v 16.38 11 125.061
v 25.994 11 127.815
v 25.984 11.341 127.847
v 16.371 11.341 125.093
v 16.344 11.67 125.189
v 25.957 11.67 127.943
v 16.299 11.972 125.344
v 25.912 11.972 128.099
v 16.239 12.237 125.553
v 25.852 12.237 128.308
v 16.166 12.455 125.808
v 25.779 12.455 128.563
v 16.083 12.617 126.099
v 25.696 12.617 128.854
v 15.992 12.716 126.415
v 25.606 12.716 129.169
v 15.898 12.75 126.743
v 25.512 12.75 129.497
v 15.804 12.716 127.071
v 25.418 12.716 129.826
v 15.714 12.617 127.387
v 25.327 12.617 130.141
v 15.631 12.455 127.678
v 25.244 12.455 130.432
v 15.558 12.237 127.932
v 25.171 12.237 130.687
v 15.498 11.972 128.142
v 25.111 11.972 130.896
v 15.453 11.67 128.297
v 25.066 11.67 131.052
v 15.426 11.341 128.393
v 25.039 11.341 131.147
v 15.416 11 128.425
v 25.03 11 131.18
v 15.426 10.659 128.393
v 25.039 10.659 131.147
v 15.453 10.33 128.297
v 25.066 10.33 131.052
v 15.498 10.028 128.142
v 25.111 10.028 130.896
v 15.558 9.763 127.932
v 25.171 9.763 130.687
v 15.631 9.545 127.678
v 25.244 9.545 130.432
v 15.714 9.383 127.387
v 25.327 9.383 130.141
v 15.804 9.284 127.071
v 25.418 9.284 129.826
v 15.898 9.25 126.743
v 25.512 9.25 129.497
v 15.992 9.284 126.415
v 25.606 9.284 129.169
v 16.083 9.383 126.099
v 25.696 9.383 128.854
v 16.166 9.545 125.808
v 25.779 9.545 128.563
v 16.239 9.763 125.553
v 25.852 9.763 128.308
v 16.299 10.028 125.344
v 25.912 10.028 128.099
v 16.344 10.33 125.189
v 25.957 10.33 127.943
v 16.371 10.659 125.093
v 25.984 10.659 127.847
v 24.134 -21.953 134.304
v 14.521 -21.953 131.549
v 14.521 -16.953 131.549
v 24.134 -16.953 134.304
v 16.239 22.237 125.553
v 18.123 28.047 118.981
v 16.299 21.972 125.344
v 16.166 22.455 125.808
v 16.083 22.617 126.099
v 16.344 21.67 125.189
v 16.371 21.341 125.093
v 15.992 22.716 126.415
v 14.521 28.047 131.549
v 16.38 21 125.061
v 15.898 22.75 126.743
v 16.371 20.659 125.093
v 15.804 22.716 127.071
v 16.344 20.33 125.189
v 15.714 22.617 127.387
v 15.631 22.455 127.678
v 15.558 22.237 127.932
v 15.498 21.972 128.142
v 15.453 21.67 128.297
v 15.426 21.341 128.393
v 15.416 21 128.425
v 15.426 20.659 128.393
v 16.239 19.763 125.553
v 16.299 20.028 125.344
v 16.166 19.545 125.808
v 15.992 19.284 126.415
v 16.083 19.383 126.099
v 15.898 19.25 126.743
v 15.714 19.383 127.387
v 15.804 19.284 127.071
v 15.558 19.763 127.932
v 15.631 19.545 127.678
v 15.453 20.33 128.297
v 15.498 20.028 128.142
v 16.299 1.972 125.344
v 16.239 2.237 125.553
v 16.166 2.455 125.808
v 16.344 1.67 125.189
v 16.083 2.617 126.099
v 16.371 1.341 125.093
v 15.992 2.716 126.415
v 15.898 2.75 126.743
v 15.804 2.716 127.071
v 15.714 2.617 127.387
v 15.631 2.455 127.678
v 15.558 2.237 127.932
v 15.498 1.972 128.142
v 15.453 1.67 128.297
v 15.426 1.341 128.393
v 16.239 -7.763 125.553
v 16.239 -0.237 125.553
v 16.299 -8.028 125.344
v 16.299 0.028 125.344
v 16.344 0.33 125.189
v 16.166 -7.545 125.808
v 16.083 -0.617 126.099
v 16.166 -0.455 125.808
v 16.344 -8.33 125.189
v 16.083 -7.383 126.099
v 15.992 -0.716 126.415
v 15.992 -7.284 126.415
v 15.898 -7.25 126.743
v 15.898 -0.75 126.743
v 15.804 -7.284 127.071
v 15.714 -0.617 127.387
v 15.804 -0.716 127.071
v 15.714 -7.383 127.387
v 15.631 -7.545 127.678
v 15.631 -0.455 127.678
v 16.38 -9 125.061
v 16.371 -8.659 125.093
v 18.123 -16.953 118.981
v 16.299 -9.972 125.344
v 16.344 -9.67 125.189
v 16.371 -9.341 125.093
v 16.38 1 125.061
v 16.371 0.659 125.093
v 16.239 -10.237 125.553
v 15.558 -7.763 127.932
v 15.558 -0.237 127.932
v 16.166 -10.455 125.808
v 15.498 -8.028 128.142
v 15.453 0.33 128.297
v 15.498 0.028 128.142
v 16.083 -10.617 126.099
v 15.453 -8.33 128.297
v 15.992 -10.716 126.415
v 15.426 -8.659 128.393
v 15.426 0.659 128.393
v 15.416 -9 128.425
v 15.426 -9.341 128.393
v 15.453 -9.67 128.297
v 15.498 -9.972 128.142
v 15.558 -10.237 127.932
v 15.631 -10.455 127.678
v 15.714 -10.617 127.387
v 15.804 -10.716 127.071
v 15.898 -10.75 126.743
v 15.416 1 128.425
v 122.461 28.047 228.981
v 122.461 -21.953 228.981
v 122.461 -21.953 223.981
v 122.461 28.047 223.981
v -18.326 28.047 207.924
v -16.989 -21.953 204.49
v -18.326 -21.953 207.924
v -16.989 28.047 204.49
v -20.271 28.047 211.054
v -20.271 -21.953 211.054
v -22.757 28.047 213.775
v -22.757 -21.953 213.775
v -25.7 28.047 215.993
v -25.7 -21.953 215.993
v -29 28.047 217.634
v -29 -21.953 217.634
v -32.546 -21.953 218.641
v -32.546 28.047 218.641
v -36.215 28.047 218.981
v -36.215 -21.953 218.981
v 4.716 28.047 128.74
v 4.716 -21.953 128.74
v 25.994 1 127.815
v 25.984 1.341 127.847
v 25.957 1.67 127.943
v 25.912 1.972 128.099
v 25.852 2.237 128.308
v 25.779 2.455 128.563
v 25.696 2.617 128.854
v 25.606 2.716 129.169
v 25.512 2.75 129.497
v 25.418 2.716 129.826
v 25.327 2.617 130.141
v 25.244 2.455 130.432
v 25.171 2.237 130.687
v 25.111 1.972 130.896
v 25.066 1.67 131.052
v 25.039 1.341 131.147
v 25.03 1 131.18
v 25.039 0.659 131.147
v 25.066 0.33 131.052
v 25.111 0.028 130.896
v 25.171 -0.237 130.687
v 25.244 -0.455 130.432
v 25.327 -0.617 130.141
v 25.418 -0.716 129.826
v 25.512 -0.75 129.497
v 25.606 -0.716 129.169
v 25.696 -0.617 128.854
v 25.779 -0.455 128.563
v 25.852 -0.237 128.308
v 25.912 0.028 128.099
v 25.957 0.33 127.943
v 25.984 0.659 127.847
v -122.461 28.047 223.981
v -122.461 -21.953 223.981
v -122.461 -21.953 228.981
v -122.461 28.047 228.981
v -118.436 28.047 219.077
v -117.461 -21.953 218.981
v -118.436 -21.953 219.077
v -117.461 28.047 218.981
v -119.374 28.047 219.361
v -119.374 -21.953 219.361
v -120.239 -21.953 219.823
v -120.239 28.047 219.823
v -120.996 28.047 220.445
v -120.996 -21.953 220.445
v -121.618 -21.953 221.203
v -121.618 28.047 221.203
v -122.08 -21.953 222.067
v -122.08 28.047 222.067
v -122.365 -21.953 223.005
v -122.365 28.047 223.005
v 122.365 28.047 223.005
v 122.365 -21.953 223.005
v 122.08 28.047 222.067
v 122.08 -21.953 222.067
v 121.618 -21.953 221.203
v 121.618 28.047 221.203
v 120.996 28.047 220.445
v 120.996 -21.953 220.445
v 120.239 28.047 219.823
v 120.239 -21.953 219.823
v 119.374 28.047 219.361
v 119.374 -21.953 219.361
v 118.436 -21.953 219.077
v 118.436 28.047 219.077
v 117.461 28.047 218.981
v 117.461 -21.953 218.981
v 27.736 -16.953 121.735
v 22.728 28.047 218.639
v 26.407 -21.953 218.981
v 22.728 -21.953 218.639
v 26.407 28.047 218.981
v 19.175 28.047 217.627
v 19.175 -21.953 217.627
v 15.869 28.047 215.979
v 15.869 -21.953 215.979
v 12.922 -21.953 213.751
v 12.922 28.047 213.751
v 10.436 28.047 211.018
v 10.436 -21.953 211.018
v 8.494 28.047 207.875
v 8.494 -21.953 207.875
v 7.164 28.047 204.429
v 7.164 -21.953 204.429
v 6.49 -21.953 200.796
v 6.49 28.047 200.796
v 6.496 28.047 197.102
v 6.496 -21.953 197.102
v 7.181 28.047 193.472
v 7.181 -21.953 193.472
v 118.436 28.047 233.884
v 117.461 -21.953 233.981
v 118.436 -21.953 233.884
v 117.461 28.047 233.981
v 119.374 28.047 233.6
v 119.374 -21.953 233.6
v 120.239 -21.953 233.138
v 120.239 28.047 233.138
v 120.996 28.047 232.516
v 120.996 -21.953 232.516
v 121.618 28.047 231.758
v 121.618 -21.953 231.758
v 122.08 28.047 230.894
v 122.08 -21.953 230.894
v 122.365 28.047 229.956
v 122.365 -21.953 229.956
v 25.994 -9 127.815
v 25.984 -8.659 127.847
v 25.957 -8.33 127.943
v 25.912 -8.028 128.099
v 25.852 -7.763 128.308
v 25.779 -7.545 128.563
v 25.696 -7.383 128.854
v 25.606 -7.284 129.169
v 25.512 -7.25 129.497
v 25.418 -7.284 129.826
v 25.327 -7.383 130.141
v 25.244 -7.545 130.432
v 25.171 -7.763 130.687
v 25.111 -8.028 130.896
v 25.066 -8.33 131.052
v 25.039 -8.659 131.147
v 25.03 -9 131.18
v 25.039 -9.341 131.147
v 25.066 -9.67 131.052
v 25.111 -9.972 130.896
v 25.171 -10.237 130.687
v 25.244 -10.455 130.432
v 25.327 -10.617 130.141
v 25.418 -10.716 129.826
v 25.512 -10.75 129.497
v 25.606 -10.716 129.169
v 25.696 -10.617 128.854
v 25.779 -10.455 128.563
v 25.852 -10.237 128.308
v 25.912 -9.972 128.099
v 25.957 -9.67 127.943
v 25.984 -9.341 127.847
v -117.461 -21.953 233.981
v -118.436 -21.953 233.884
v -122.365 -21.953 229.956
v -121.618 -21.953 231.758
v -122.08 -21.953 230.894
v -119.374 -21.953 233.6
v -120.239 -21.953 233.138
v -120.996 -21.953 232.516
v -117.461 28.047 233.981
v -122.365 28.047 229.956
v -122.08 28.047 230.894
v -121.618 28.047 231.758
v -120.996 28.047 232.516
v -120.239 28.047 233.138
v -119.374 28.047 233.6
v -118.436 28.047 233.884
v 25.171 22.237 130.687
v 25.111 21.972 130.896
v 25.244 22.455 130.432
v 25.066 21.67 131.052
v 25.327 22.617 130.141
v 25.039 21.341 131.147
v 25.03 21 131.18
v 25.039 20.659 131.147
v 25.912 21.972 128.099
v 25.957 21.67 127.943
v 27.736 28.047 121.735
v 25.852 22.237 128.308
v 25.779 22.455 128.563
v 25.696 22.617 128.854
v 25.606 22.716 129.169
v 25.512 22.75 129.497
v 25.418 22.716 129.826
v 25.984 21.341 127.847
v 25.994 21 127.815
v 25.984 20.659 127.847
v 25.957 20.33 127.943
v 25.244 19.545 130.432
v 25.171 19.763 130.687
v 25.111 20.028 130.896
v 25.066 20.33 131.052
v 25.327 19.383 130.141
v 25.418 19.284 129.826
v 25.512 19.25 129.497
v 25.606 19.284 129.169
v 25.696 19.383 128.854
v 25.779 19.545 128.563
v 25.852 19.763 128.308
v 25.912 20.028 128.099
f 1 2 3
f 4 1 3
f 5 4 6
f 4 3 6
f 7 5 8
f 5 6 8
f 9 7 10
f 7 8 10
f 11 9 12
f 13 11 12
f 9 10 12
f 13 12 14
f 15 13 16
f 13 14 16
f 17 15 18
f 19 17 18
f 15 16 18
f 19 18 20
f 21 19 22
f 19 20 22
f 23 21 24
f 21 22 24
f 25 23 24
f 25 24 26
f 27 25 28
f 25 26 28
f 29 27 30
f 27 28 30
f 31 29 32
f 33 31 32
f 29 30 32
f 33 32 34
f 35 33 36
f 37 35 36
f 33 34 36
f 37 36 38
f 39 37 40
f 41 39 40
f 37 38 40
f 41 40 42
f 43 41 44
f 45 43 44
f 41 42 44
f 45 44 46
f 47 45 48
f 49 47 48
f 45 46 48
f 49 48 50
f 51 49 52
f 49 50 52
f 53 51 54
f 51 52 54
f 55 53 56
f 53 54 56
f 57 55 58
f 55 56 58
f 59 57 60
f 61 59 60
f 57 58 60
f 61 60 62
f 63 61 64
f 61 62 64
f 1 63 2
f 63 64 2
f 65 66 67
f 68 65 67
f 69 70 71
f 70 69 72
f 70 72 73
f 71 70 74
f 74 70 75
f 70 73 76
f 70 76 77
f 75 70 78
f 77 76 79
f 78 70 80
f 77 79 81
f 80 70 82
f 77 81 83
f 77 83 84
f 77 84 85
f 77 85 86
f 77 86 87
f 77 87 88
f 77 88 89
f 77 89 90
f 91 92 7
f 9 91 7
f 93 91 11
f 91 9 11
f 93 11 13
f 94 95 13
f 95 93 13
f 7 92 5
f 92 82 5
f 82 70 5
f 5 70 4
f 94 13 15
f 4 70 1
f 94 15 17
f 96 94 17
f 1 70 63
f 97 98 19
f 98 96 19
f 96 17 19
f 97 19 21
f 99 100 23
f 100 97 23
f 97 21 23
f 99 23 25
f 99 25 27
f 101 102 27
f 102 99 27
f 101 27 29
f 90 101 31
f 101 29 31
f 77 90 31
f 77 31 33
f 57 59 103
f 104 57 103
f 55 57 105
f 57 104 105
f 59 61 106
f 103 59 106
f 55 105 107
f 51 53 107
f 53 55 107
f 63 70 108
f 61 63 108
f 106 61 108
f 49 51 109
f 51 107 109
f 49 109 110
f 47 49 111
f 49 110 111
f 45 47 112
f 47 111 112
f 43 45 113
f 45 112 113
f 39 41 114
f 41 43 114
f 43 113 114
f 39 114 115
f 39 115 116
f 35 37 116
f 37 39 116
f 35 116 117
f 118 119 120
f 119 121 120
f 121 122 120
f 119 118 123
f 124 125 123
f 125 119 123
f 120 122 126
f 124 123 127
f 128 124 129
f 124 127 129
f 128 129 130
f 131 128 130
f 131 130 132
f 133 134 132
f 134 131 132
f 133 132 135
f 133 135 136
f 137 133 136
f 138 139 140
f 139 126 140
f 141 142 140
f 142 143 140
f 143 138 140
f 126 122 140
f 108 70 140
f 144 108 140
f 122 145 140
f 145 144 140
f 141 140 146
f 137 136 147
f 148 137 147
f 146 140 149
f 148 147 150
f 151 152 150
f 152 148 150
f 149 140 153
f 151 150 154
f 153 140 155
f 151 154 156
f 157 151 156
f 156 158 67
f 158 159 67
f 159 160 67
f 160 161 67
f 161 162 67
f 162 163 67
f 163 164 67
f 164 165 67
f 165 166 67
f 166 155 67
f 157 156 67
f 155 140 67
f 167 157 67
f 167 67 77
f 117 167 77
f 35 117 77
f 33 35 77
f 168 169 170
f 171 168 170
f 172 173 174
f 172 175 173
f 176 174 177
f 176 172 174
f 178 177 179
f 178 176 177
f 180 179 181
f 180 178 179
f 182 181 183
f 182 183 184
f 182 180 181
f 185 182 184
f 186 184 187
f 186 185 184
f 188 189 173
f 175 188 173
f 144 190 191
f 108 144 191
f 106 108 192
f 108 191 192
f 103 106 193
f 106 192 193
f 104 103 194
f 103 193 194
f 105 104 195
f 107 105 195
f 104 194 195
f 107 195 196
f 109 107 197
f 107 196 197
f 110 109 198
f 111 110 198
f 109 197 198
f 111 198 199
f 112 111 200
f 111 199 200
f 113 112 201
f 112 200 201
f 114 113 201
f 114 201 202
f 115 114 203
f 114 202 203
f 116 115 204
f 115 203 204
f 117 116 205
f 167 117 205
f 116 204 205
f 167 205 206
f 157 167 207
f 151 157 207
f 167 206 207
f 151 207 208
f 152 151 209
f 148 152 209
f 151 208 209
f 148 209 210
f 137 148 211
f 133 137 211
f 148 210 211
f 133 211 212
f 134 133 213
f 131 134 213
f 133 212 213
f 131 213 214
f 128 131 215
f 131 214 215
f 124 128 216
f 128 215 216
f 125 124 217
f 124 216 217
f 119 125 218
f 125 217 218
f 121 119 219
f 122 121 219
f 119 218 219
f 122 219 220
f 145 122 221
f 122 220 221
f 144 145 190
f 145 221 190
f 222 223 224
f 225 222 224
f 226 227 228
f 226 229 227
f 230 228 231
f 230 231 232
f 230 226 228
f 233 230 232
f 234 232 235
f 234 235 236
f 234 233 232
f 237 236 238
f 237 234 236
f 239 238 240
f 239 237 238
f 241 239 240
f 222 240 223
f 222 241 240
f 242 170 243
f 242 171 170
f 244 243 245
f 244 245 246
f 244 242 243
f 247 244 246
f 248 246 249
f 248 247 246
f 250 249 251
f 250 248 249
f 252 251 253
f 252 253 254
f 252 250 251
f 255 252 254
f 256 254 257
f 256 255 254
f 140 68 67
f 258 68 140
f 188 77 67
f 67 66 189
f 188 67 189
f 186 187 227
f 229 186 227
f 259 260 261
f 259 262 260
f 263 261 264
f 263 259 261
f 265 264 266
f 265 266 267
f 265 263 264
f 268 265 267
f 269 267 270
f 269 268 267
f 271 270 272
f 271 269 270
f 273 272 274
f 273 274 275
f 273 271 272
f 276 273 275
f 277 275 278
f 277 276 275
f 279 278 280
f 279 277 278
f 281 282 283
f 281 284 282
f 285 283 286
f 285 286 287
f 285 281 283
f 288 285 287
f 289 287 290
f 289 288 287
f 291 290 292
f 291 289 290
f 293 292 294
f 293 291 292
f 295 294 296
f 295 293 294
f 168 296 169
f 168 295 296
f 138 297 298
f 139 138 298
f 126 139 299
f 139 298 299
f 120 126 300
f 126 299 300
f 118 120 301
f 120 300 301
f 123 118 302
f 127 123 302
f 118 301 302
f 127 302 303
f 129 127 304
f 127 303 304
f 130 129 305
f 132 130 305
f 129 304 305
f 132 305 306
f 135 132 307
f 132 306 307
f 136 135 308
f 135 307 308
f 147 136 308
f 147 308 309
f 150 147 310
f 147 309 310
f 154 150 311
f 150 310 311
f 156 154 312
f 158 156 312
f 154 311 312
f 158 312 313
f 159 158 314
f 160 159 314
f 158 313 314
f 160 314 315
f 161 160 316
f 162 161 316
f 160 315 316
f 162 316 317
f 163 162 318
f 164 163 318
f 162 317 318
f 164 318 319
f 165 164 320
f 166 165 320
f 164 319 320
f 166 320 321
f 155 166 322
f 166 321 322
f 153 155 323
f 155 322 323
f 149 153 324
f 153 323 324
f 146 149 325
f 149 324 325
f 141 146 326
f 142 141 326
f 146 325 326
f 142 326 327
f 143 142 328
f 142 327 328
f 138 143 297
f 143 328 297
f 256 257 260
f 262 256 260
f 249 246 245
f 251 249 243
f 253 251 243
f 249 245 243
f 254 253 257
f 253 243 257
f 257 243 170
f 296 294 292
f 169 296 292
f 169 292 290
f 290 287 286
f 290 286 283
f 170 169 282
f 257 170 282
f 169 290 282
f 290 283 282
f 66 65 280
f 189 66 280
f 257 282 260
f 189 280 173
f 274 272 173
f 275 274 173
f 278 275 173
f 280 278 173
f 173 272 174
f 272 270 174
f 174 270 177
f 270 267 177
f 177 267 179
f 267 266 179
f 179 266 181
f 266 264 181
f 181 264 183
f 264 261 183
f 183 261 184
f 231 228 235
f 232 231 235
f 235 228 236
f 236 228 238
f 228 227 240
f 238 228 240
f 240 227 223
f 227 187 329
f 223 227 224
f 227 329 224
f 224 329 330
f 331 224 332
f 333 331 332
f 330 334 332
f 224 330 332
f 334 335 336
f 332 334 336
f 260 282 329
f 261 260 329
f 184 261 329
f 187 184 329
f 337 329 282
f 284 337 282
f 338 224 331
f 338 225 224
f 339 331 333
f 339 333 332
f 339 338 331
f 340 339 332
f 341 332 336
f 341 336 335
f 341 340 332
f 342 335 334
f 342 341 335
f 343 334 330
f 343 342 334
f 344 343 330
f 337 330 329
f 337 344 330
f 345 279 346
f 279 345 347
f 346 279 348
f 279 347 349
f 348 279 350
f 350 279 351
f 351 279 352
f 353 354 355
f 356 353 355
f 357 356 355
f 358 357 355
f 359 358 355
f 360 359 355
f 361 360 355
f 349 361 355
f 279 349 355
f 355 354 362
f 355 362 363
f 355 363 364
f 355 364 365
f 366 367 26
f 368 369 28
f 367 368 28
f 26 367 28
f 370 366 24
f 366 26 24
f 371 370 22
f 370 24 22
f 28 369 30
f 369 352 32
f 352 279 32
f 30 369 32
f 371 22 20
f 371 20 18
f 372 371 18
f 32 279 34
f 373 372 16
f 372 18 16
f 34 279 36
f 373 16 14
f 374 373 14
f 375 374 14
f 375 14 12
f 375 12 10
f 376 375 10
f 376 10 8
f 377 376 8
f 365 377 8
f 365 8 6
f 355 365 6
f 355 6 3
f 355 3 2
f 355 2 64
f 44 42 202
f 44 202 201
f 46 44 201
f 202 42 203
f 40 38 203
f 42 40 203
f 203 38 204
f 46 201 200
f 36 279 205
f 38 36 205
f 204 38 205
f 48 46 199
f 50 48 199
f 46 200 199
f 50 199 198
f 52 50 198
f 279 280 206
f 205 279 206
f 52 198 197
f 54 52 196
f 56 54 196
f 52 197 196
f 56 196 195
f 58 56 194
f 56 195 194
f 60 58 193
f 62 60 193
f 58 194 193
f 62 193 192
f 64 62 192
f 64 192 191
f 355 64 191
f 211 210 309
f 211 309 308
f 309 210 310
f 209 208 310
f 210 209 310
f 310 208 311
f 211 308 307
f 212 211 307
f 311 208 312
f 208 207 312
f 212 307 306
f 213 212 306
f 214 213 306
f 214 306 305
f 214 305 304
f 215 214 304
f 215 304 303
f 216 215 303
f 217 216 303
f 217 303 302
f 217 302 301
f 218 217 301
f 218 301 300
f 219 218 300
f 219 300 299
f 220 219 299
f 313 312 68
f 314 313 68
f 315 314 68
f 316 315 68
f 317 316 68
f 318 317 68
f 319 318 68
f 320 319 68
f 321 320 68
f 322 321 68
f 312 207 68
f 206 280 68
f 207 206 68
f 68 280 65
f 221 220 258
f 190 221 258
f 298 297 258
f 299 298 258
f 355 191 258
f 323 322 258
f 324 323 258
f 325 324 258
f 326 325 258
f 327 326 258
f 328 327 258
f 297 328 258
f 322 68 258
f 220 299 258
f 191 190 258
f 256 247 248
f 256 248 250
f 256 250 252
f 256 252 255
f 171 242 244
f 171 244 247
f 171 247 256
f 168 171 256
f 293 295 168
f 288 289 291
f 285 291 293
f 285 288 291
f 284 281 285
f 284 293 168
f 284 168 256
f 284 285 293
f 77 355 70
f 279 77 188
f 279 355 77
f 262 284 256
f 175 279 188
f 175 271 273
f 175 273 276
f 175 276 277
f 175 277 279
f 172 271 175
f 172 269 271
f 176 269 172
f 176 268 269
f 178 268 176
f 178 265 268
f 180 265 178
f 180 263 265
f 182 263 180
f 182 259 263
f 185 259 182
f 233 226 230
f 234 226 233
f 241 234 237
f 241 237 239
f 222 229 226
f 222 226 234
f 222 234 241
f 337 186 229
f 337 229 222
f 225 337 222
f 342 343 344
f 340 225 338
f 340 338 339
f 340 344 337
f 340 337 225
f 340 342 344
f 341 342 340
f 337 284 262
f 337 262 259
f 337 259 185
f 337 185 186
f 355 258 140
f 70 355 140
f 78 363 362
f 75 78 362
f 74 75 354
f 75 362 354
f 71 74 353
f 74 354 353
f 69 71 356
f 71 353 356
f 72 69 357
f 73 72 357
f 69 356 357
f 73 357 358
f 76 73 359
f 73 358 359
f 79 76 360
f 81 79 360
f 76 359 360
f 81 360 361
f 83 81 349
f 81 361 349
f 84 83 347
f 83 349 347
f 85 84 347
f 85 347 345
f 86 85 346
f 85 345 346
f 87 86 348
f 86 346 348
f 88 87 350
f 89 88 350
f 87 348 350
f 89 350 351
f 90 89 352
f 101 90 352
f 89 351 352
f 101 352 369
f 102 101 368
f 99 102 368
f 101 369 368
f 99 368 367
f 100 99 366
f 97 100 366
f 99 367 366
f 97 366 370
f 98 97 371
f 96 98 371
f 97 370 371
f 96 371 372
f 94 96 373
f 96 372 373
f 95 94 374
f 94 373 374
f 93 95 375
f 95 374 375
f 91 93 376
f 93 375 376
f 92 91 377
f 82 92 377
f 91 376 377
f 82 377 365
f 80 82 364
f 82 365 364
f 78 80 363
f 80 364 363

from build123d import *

# Parameters (mm, degrees)
EXTRUDE_1_DEPTH     = 50
FILLET_1_R          = 20
FILLET_2_R          = 5
SKETCH_2_R          = 1.75
CUT_EXTRUDE_1_DEPTH = 10
SKETCH_3_W          = 13.074735308
SKETCH_3_H          = 5
CUT_EXTRUDE_2_DEPTH = 10


with BuildPart() as part:
    # 草图1 → 凸台-拉伸1 (new body)
    with BuildSketch(Plane.XZ.offset(21.952986856)):
        Polygon((27.73572569, 121.735034283), (18.122569365, 118.980542412), (14.521144153, 131.549489855), (4.715724701, 128.739908146), (-21.141245178, 218.980542412), (-122.460743693, 218.980542412), (-122.460743693, 233.980542412), (122.460743693, 233.980542412), (122.460743693, 218.980542412), (-0.12837561, 218.980542412), align=None)
    extrude(amount=-EXTRUDE_1_DEPTH)

    # 圆角1
    fillet_1_edges = [part.edges().sort_by_distance(p)[0] for p in [
        (-21.141245178, 3.047013144, 218.980542412),
        (-0.12837561, 3.047013144, 218.980542412),
    ]]
    fillet(fillet_1_edges, radius=FILLET_1_R)

    # 圆角2
    fillet_2_edges = [part.edges().sort_by_distance(p)[0] for p in [
        (-122.460743693, 3.047013144, 218.980542412),
        (-122.460743693, 3.047013144, 233.980542412),
        (122.460743693, 3.047013144, 233.980542412),
        (122.460743693, 3.047013144, 218.980542412),
    ]]
    fillet(fillet_2_edges, radius=FILLET_2_R)

    # 草图2 → 切除-拉伸1 (cut)
    with BuildSketch(Plane(origin=(57.866012783, 0, 16.580554444), x_dir=(0.275449187, 0, -0.961315633), z_dir=(0.961315633, 0, 0.275449187))):
        with Locations((-117.460743693, -9)):
            Circle(SKETCH_2_R)
        with Locations((-117.460743693, 1)):
            Circle(SKETCH_2_R)
        with Locations((-117.460743693, 11)):
            Circle(SKETCH_2_R)
        with Locations((-117.460743693, 21)):
            Circle(SKETCH_2_R)
    extrude(amount=-CUT_EXTRUDE_1_DEPTH, mode=Mode.SUBTRACT)

    # 草图3 → 切除-拉伸2 (cut)
    with BuildSketch(Plane(origin=(57.866012783, 0, 16.580554444), x_dir=(0.275449187, 0, -0.961315633), z_dir=(0.961315633, 0, 0.275449187))):
        with Locations((-115.923376039, -19.452986856)):
            Rectangle(SKETCH_3_W, SKETCH_3_H)
    extrude(amount=-CUT_EXTRUDE_2_DEPTH, mode=Mode.SUBTRACT)


solid = part.part
